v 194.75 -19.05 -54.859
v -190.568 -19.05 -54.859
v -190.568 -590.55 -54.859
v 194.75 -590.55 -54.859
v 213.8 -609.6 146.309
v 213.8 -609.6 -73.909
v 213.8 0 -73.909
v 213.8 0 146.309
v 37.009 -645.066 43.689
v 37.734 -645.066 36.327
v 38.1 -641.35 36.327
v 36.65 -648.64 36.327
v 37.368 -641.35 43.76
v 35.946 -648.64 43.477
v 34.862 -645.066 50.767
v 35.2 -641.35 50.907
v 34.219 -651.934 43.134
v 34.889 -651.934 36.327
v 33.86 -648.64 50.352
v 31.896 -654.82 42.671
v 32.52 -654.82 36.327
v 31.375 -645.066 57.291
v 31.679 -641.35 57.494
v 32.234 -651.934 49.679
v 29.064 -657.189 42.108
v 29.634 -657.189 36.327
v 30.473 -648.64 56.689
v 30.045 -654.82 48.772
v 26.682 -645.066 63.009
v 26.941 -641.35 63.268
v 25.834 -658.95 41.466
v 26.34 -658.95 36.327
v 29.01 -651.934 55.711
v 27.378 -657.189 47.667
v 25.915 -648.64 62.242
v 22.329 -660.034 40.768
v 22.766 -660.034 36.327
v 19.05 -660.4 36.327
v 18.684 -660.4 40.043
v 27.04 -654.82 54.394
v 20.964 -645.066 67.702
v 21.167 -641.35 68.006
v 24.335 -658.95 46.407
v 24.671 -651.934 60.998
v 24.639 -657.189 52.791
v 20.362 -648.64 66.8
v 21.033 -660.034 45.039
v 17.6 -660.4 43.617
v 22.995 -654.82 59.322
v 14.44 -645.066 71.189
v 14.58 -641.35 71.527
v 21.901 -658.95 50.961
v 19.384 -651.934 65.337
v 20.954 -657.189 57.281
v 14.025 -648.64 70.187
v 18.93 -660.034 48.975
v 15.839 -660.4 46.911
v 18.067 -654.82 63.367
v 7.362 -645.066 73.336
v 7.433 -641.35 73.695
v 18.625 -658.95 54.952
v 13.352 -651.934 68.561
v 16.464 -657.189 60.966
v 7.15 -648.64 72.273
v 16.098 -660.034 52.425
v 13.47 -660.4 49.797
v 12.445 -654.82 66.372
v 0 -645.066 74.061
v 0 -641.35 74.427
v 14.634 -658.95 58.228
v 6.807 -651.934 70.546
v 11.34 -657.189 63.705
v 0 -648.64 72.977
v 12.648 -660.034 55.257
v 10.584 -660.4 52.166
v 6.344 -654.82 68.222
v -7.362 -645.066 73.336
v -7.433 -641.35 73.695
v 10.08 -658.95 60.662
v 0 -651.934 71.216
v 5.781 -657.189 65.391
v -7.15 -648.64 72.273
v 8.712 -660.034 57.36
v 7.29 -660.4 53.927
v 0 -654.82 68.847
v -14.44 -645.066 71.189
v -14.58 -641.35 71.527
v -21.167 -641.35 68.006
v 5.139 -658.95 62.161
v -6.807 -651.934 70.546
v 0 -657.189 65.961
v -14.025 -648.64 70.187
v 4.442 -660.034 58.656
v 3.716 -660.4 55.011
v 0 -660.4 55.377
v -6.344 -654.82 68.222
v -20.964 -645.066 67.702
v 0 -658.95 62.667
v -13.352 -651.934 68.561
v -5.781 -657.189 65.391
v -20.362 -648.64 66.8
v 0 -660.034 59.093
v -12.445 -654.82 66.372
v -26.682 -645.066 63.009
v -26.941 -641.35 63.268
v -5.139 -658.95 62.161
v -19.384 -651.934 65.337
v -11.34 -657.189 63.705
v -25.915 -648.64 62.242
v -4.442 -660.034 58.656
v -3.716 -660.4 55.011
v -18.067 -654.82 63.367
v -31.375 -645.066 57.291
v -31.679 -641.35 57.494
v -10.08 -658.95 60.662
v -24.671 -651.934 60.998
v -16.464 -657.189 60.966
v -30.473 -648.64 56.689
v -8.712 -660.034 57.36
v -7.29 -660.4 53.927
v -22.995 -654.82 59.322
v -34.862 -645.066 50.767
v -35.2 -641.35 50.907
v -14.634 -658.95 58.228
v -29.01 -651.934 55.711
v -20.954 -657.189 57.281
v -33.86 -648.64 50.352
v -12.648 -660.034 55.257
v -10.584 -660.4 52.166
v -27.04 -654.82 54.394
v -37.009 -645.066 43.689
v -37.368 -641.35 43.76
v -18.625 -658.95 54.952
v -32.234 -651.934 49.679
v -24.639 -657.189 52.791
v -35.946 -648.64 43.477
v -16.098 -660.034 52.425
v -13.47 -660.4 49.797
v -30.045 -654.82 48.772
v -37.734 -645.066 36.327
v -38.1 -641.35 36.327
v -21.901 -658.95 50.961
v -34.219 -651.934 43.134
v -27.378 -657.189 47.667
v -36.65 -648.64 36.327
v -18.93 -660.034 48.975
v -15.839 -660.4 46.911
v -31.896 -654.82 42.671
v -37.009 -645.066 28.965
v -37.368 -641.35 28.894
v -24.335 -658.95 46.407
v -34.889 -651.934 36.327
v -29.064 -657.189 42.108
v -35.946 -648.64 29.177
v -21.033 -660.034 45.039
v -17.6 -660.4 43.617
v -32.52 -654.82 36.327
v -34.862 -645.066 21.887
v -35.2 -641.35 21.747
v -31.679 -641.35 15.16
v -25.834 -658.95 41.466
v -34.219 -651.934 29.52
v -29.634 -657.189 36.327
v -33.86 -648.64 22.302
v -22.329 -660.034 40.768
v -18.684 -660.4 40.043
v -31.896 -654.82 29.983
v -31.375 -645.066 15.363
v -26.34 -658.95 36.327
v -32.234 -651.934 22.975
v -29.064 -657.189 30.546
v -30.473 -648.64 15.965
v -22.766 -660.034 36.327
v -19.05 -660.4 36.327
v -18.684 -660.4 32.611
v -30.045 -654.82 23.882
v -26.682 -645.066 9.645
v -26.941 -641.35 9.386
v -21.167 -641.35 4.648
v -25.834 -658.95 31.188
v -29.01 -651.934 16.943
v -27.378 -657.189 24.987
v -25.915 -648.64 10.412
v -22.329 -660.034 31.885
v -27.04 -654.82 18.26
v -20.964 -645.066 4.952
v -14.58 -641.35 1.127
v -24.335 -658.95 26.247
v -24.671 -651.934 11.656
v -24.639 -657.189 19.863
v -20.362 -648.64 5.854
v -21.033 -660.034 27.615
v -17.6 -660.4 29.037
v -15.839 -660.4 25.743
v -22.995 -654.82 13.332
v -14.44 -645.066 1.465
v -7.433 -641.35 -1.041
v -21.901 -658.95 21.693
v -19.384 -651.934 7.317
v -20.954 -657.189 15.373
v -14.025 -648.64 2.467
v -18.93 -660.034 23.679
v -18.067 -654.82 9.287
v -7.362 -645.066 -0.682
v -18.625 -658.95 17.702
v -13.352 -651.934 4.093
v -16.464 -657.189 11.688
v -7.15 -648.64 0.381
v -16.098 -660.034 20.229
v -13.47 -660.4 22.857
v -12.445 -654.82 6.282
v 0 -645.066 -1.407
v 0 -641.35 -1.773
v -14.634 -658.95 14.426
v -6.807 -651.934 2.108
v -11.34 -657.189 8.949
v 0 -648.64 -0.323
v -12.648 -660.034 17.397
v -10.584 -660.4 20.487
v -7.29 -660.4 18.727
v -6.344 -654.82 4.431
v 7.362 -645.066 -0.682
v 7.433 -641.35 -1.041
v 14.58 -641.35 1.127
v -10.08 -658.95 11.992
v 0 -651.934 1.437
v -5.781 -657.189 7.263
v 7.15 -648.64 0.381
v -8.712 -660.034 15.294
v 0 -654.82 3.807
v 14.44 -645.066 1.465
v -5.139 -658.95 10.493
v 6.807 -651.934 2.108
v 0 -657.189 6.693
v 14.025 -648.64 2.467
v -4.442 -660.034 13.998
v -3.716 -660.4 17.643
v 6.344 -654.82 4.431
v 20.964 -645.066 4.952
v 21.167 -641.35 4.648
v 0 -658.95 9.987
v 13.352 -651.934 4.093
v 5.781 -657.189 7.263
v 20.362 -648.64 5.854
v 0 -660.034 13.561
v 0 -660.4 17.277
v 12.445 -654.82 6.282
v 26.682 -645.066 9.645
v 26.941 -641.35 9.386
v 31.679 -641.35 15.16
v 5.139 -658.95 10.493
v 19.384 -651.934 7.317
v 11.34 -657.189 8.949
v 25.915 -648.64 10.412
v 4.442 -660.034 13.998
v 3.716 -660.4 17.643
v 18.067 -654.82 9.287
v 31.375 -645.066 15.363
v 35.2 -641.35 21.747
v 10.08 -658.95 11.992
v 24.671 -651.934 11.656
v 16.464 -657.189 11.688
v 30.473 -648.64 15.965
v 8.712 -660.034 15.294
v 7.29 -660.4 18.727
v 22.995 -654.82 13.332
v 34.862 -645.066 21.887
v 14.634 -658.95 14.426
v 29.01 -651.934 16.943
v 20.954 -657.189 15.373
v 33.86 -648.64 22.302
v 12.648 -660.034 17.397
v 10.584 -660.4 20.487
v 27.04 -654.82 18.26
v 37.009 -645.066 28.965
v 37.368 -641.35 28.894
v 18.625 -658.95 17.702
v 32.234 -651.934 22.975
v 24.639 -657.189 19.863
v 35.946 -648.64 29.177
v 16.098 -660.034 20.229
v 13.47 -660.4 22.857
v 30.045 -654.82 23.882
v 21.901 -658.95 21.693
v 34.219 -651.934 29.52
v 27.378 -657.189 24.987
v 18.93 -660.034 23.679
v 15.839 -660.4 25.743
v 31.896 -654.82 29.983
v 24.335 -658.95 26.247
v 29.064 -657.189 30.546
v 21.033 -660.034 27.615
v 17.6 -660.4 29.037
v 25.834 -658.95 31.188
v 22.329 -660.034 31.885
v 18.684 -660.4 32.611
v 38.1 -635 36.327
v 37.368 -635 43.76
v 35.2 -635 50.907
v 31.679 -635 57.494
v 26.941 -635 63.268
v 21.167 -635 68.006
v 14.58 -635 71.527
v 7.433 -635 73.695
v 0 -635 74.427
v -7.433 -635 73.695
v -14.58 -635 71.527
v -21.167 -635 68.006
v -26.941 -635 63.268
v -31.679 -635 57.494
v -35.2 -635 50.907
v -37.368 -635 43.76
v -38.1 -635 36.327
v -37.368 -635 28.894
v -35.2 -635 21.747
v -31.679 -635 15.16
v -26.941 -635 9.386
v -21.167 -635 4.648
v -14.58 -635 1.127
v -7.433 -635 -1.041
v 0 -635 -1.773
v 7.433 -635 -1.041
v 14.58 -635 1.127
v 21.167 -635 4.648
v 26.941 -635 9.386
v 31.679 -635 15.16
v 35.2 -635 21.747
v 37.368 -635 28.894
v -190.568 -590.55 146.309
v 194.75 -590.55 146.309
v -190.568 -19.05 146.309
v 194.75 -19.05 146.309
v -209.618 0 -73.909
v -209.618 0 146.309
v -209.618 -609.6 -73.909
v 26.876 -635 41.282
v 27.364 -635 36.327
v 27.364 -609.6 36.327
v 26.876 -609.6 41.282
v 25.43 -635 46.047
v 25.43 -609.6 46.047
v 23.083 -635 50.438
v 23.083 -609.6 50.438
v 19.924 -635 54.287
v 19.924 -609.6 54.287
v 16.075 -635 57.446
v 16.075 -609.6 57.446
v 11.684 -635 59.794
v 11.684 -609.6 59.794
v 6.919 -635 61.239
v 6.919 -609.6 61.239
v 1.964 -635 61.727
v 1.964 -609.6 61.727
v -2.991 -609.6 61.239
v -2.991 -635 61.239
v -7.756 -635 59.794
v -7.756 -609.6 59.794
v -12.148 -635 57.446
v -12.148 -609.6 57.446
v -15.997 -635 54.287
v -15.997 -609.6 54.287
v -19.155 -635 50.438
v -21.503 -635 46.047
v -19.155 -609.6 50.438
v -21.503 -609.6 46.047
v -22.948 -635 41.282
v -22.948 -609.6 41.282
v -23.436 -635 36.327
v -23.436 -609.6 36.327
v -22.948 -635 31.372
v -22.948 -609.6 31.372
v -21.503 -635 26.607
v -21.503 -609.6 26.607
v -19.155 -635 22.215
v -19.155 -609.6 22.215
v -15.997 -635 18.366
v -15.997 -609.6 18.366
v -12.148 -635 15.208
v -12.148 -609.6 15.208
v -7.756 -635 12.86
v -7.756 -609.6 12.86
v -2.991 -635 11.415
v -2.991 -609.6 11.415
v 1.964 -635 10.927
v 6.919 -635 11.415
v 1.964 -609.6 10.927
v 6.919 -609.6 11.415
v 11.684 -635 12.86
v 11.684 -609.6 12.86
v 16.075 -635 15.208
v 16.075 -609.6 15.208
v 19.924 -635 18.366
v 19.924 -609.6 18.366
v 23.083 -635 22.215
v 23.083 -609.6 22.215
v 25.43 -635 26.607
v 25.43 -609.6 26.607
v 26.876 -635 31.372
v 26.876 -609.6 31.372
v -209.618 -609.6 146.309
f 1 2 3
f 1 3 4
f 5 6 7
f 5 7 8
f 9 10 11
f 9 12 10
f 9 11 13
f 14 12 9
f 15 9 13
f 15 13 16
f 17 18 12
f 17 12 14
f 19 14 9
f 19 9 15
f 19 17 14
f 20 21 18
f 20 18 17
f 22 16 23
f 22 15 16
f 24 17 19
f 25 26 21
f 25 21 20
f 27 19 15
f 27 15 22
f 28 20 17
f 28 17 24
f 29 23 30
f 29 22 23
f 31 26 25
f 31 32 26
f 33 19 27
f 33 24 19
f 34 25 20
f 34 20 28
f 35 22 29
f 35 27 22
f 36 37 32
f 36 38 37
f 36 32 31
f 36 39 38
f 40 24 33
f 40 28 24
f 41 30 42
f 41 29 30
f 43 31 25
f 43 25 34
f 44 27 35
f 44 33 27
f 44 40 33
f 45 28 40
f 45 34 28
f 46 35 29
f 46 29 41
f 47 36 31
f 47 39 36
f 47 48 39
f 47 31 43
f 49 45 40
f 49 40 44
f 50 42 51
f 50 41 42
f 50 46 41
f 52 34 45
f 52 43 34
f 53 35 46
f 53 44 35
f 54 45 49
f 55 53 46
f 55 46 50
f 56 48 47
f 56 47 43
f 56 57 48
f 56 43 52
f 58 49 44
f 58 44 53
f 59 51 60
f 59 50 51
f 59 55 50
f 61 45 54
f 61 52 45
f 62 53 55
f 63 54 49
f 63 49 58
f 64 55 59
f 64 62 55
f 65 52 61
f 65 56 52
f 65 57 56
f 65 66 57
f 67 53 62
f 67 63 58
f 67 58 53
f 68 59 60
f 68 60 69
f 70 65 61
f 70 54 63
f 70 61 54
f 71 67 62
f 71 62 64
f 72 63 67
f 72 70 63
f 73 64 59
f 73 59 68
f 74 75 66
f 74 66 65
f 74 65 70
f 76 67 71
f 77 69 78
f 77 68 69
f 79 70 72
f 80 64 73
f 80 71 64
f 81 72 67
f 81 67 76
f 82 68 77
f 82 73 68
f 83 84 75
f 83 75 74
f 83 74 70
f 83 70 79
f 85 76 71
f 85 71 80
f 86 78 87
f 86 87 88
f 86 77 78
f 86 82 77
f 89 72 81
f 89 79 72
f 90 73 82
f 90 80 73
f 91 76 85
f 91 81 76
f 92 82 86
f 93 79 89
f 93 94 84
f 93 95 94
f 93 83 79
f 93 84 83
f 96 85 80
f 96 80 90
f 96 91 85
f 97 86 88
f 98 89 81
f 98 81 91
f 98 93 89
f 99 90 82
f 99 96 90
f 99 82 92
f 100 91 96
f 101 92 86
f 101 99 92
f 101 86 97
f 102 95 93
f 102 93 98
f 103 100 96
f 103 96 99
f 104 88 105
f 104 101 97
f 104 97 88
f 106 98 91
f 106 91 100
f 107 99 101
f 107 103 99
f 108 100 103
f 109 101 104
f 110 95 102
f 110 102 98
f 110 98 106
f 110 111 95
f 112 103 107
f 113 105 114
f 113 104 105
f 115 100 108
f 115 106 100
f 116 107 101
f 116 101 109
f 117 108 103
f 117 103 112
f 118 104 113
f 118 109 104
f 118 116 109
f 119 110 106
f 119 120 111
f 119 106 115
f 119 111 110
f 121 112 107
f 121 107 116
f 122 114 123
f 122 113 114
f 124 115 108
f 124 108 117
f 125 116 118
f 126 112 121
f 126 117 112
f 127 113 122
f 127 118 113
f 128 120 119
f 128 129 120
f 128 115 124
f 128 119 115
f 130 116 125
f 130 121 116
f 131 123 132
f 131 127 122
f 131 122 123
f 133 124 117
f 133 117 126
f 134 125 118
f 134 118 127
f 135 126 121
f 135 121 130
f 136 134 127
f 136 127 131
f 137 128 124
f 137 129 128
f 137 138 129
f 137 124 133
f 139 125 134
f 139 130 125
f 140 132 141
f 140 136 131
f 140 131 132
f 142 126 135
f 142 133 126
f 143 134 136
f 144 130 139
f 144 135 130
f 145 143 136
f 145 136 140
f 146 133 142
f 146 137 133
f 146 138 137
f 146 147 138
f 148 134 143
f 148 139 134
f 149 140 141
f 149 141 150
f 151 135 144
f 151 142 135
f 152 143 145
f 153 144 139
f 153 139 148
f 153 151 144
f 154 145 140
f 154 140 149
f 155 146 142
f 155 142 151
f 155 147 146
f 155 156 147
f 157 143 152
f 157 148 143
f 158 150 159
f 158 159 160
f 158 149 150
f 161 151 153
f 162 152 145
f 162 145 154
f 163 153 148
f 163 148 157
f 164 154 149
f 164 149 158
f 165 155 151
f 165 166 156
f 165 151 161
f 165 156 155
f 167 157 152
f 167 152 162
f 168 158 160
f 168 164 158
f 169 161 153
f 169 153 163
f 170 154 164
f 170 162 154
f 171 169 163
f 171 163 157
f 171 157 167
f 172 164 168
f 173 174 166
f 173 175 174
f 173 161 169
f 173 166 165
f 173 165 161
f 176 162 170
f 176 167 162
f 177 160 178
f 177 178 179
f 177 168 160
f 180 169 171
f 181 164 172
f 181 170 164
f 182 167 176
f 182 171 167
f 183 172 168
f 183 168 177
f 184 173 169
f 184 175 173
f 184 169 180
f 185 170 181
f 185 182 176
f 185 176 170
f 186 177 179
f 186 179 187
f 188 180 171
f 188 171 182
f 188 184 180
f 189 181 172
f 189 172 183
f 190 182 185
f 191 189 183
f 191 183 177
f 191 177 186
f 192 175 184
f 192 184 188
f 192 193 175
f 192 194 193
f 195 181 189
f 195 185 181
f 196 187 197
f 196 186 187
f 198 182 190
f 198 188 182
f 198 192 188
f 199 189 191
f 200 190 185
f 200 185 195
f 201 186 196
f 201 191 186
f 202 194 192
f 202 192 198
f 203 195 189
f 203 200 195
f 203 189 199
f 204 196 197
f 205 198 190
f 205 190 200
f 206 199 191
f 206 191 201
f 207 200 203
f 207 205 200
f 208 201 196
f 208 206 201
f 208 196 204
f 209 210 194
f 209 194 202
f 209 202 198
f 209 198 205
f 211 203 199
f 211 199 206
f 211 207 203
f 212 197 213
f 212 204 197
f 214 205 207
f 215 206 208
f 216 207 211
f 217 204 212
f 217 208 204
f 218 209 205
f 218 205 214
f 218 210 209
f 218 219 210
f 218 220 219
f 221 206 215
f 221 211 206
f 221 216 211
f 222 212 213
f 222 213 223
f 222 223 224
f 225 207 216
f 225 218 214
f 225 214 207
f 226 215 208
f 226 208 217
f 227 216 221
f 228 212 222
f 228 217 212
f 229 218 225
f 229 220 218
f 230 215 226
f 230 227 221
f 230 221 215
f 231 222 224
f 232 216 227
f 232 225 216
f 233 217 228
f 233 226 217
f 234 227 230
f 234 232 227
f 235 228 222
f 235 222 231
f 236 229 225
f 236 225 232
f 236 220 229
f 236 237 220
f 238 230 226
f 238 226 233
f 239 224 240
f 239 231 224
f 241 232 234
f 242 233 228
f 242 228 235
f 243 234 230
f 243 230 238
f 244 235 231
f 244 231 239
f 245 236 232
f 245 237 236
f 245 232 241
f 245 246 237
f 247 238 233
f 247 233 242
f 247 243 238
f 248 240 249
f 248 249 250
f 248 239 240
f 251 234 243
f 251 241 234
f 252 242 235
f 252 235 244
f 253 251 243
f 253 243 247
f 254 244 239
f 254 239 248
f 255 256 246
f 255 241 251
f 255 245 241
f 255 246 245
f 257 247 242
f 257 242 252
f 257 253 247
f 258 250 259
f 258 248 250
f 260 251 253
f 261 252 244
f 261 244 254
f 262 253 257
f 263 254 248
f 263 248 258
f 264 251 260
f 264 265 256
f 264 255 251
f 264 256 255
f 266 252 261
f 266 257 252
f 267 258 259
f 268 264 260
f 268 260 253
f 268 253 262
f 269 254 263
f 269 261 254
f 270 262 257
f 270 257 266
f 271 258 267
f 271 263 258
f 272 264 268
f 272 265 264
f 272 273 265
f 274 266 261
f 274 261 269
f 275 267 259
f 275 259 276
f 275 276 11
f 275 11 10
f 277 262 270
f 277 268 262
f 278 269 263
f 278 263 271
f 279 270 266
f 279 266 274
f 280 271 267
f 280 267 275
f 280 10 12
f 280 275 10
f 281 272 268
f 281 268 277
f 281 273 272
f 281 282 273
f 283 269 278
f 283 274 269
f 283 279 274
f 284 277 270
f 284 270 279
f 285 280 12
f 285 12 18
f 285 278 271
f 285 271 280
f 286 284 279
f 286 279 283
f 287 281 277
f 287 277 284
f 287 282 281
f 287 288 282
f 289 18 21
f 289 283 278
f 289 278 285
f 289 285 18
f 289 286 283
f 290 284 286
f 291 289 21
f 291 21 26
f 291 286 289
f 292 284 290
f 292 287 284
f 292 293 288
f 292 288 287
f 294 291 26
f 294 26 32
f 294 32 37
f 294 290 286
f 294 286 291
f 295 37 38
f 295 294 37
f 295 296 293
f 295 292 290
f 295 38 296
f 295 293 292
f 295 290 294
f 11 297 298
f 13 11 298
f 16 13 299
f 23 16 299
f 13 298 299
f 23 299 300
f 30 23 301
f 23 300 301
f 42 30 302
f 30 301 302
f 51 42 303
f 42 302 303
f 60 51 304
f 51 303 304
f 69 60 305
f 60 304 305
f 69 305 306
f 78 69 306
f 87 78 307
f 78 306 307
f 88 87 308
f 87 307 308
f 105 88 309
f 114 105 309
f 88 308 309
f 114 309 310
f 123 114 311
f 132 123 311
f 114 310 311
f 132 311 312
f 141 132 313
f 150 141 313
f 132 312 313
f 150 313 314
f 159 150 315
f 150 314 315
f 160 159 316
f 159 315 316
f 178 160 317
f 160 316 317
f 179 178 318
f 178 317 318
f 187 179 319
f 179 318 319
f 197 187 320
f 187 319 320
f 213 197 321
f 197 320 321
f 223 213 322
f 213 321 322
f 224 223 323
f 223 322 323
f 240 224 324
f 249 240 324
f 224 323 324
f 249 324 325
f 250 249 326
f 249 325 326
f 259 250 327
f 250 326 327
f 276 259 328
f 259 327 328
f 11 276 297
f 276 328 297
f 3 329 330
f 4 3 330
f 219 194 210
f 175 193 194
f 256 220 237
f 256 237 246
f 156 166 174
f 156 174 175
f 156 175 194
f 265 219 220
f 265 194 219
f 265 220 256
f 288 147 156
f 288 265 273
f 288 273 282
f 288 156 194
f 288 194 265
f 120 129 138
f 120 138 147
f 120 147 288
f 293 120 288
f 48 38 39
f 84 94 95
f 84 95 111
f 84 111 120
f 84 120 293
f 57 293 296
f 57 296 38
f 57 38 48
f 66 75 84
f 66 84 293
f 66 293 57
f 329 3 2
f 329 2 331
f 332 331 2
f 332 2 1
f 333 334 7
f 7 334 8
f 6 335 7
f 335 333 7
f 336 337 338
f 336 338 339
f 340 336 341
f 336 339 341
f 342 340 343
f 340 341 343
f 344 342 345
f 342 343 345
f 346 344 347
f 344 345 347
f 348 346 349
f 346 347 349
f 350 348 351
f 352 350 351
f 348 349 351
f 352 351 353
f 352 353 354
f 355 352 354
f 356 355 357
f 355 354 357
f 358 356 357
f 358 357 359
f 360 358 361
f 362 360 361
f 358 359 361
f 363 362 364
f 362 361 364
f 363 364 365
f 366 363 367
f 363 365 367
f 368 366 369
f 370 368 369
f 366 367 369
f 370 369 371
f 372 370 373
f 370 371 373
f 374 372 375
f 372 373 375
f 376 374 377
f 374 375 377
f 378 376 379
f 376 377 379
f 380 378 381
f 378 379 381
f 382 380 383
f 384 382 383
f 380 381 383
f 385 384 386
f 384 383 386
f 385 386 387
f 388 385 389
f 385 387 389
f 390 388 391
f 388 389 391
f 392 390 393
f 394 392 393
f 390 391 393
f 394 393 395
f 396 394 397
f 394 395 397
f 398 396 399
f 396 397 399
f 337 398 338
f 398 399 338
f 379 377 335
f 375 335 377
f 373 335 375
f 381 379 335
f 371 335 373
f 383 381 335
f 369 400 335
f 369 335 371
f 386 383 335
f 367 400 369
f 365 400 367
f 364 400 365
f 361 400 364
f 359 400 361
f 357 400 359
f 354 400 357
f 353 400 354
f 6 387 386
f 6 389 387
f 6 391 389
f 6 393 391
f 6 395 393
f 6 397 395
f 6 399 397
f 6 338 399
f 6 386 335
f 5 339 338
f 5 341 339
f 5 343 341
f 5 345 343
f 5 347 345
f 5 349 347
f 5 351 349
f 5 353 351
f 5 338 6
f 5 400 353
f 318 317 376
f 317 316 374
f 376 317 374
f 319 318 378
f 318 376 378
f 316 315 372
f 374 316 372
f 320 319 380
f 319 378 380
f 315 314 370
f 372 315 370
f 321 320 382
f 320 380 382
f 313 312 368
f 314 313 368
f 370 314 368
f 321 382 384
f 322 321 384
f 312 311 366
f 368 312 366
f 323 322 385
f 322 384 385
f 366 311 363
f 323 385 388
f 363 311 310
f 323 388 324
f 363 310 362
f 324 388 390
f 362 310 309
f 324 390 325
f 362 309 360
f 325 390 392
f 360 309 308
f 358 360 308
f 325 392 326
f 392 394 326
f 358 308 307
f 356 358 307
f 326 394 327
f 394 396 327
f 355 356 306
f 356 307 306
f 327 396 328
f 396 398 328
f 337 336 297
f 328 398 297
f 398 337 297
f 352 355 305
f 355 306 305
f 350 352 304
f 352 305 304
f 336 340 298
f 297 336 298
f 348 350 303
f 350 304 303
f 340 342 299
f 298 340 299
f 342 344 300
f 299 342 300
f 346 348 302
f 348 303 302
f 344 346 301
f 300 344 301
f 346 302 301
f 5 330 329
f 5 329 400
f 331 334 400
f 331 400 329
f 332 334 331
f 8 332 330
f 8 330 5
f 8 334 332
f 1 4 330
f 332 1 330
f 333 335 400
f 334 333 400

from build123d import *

# Parameters (mm, degrees)
F0_W     = 385.318
F0_H     = 201.168
F1_DEPTH = 19.05
F0_W_2   = 19.05
F0_H_2   = 19.05
F2_DEPTH = 590.55
F3_W     = 423.418
F3_H     = 220.218
F4_DEPTH = 19.05
F5_R     = 25.4
F6_DEPTH = 25.4
F8_R     = 38.1
F9_DEPTH = 25.4
F10_R    = 19.05


with BuildPart() as f1:
    # F0 (on Front) → F1 (new body)
    with BuildSketch(Plane.XZ):
        with Locations((2.090853, 45.724981)):
            Rectangle(F0_W, F0_H)
    extrude(amount=F1_DEPTH)

    # F0 (on Front) → F2 (join)
    with BuildSketch(Plane.XZ):
        with Locations((204.274853, 45.724981)):
            Rectangle(F0_W_2, F0_H)
        with Locations((-200.093147, 45.724981)):
            Rectangle(F0_W_2, F0_H)
        with Locations((2.090853, -64.384019)):
            Rectangle(F0_W, F0_H_2)
        with Locations((-200.093147, -64.384019)):
            Rectangle(F0_W_2, F0_H_2)
        with Locations((204.274853, -64.384019)):
            Rectangle(F0_W_2, F0_H_2)
    extrude(amount=F2_DEPTH)

    # F3 (on face) → F4 (join)
    with BuildSketch(Plane.XZ.offset(590.55)):
        with Locations((2.090853, 36.199981)):
            Rectangle(F3_W, F3_H)
    extrude(amount=F4_DEPTH)

    # F5 (on face) → F6 (join)
    with BuildSketch(Plane.XZ.offset(609.6)):
        with Locations((1.963853, 36.326981)):
            Circle(F5_R)
    extrude(amount=F6_DEPTH)

    # F8 (on face) → F9 (join)
    with BuildSketch(Plane.XZ.offset(635)):
        with Locations((0, 36.326981)):
            Circle(F8_R)
    extrude(amount=F9_DEPTH)

    # F10
    f10_edges = [f1.edges().sort_by_distance(p)[0] for p in [
        (-38.1, -660.4, 36.326981),
    ]]
    fillet(f10_edges, radius=F10_R)


solid = f1.part
